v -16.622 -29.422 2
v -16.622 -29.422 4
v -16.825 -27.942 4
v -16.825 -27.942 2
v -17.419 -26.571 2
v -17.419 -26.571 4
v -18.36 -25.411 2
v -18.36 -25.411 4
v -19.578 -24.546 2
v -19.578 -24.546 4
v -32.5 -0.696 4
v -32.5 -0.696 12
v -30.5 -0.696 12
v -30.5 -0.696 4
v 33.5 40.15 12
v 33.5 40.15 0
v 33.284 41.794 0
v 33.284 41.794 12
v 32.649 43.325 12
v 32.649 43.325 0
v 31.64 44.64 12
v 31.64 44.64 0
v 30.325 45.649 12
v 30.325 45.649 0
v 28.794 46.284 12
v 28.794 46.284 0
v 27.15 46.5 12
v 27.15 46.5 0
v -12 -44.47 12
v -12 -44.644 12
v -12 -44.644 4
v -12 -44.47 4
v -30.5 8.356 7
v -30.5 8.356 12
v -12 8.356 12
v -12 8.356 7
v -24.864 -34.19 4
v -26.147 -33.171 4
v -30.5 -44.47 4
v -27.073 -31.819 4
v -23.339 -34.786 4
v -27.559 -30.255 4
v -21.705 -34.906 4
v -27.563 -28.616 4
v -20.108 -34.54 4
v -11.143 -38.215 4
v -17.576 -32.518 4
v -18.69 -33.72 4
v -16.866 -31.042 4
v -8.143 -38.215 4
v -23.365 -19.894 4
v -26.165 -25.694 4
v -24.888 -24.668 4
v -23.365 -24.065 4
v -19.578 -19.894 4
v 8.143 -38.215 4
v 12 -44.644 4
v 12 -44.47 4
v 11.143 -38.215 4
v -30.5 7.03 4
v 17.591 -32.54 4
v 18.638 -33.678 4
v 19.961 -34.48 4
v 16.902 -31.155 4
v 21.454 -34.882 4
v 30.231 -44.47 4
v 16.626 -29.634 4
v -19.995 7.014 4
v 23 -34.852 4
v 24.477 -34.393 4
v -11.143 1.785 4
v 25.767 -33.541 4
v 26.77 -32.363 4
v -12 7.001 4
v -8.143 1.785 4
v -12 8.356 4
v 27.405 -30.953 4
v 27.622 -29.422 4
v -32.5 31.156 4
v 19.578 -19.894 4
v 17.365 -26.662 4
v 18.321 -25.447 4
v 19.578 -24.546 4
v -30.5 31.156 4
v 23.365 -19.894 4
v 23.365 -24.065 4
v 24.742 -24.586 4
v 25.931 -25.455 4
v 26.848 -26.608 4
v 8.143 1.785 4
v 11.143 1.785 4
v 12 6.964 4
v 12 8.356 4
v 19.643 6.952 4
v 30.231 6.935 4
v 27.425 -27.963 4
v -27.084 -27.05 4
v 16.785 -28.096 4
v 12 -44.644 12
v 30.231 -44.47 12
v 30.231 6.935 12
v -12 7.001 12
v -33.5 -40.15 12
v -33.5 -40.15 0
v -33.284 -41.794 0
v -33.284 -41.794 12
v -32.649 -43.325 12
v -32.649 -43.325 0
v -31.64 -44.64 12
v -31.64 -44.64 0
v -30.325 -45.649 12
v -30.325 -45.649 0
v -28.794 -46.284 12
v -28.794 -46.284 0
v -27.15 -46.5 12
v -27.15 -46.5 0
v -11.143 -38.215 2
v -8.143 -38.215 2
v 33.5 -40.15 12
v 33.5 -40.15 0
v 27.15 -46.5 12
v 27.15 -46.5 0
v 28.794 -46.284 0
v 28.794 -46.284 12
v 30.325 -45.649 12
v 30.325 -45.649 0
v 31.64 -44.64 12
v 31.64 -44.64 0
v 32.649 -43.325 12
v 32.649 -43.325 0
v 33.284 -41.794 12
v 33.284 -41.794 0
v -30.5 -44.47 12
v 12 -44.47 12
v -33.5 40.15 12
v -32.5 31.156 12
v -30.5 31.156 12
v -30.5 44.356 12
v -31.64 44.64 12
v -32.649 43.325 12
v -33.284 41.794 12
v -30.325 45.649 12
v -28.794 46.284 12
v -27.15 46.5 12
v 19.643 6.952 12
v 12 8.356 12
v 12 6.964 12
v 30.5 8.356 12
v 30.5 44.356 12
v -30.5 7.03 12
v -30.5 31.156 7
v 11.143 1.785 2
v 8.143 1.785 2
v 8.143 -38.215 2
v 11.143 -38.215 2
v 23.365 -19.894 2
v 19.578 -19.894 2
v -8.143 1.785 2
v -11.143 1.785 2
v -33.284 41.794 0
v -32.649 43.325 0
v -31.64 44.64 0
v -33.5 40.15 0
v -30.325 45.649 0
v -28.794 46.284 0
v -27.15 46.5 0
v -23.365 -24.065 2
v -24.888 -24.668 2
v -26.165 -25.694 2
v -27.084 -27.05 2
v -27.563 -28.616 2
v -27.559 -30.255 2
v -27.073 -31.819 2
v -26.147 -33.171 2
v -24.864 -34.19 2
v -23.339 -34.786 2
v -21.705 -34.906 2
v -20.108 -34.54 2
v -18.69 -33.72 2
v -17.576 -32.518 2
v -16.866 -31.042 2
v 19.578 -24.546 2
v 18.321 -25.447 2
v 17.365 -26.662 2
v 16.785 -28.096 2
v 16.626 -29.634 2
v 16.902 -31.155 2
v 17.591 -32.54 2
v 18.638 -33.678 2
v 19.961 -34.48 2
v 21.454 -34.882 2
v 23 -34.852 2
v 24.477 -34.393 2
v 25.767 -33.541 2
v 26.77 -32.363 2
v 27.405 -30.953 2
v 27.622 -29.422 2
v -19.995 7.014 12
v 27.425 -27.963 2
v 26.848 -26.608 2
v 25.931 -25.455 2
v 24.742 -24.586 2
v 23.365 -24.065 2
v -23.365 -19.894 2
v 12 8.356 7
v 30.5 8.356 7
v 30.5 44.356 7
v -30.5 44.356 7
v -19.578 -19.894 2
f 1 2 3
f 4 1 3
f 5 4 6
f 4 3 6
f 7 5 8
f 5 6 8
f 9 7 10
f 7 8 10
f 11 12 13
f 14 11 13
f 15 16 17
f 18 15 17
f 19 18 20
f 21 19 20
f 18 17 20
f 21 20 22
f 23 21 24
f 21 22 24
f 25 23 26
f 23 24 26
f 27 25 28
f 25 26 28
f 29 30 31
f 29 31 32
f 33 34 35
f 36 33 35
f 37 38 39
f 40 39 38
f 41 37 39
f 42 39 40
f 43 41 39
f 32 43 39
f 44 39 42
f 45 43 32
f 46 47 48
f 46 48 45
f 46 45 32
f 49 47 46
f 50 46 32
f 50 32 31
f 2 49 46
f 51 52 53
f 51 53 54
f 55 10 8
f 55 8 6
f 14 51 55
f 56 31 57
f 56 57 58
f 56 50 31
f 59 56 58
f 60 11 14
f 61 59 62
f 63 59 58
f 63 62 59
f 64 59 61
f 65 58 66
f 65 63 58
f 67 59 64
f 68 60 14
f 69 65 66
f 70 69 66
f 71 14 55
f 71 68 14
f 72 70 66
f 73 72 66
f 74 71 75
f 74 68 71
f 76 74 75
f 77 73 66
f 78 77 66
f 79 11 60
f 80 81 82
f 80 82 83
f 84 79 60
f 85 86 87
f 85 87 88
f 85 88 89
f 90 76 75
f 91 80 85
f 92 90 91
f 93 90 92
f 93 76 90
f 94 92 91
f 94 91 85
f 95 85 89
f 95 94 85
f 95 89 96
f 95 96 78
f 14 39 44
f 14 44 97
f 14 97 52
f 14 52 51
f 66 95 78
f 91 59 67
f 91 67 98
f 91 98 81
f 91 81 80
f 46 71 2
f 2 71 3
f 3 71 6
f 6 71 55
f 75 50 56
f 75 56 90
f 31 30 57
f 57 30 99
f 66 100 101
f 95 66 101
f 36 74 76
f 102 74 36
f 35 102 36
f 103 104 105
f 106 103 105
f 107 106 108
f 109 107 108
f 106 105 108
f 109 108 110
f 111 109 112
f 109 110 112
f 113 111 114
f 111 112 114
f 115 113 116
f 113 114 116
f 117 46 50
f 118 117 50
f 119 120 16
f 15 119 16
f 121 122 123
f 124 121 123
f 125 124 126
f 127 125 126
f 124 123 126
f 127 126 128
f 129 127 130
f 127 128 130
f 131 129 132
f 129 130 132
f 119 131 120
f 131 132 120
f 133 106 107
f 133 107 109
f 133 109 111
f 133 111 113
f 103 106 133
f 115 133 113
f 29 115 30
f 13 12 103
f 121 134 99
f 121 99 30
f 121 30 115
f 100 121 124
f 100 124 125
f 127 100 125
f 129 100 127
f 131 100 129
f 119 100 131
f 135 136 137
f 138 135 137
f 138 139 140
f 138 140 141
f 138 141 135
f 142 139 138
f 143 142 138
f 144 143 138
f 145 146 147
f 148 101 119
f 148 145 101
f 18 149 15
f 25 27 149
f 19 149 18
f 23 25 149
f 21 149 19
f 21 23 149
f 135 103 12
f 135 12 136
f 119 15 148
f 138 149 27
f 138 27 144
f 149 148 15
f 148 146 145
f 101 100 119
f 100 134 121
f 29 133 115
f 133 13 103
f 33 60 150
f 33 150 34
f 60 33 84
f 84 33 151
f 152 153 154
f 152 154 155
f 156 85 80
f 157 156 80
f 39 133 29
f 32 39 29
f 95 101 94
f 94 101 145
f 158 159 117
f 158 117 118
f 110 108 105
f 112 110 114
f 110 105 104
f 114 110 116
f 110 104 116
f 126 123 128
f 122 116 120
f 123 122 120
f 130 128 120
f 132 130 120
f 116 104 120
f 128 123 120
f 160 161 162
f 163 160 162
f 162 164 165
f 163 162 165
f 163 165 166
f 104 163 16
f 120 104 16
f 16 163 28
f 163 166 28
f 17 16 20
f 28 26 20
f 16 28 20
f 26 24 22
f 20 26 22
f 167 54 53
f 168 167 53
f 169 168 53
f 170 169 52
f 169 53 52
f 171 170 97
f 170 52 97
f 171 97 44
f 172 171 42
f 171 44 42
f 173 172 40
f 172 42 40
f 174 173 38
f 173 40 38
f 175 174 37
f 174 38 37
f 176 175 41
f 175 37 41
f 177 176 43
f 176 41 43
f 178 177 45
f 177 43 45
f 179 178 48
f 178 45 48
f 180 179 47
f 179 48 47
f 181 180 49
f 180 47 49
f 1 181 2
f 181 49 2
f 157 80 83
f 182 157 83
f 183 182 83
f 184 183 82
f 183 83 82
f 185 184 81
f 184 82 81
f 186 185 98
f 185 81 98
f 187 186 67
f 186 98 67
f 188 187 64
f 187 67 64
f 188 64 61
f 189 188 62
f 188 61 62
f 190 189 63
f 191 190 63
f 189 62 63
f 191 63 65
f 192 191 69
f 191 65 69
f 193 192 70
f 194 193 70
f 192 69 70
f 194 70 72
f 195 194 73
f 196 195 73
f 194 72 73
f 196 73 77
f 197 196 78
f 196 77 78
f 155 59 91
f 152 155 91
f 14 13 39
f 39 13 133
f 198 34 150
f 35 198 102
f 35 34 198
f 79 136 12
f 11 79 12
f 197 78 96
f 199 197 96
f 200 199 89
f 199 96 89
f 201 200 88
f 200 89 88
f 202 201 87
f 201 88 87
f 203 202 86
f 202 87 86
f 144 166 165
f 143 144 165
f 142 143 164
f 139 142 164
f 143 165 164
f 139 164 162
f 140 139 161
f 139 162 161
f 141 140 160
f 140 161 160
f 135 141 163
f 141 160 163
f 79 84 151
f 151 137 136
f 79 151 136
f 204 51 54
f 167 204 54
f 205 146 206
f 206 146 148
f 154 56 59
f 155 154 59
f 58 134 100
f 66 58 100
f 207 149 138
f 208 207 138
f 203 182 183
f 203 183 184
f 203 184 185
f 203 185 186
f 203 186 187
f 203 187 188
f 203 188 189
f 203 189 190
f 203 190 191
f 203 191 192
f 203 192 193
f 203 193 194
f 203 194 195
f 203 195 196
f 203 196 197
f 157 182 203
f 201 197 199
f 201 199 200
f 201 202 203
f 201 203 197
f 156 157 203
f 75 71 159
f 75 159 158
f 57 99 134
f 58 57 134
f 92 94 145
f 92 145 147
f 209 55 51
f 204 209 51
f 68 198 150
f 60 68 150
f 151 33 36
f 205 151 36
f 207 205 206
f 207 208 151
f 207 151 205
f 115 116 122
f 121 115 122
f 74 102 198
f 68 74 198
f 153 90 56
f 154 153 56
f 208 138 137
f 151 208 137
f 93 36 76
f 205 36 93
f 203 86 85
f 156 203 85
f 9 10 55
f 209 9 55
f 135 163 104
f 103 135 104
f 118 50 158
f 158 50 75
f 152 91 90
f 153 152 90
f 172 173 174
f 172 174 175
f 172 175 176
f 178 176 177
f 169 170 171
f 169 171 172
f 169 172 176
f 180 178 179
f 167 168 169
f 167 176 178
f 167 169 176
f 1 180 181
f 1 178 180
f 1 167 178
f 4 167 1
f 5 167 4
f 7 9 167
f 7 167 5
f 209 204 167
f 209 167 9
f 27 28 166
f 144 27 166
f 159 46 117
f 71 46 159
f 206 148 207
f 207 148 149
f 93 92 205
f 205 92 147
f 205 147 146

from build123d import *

# Parameters (mm, degrees)
F1_DEPTH = 12
F3_DEPTH = 5
F2_W     = 24
F2_H     = 53
F5_DEPTH = 8
F6_DEPTH = 10
F7_W     = 3
F7_H     = 40
F8_DEPTH = 10
F9_DEPTH = 10


with BuildPart() as f1:
    # F0 (on Top) → F1 (new body)
    with BuildSketch(Plane.XY):
        with BuildLine():
            Line((27.15, 46.5), (-27.15, 46.5))
            ThreePointArc((-27.15, 46.5), (-31.6401280605, 44.6401280605), (-33.5, 40.15))
            Line((-33.5, 40.15), (-33.5, -40.15))
            ThreePointArc((-33.5, -40.15), (-31.6401280605, -44.6401280605), (-27.15, -46.5))
            Line((-27.15, -46.5), (27.15, -46.5))
            ThreePointArc((27.15, -46.5), (31.6401280605, -44.6401280605), (33.5, -40.15))
            Line((33.5, -40.15), (33.5, 40.15))
            ThreePointArc((33.5, 40.15), (31.6401280605, 44.6401280605), (27.15, 46.5))
        make_face()
    extrude(amount=F1_DEPTH)

    # F2 (on face) → F3 (cut)
    with BuildSketch(Plane.XY.offset(12)):
        Polygon((-30.5, 31.1559867114), (-30.5, 8.3555228412), (-12, 8.3555228412), (12, 8.3555228412), (30.5, 8.3555228412), (30.5, 44.3555228412), (-30.5, 44.3555228412), align=None)
    extrude(amount=-F3_DEPTH, mode=Mode.SUBTRACT)

    # F4 (on face) + F2 (on face) → F5 (cut)
    with BuildSketch(Plane.XY.offset(12)):
        Polygon((-19.9947099381, 7.0137236979), (-30.5000375956, 7.0301252197), (-30.5000375956, -0.696099014), (-30.5000375956, -0.6988210371), (-30.5000375956, -44.4698496722), (-12, -44.4698496722), (-12, 7.0012418968), align=None)
        with BuildLine():
            Line((-19.57828179, -19.8942141583), (-19.57828179, -24.546026914))
            ThreePointArc((-19.57828179, -24.546026914), (-17.4189463665, -26.5711645765), (-16.6222270916, -29.4223310783))
            ThreePointArc((-16.6222270916, -29.4223310783), (-25.5439247807, -33.7283715941), (-23.364767064, -24.064524212))
            Line((-23.364767064, -24.064524212), (-23.364767064, -19.8942141583))
            Line((-23.364767064, -19.8942141583), (-19.57828179, -19.8942141583))
        make_face(mode=Mode.SUBTRACT)
        Polygon((19.6427109083, 6.9518394763), (12, 6.9637717162), (12, -44.4698496722), (30.2305370569, -44.4698496722), (30.2305370569, 6.9353091531), align=None)
        with BuildLine():
            Line((23.364767064, -19.8942141583), (23.364767064, -24.064524212))
            ThreePointArc((23.364767064, -24.064524212), (26.4282676075, -26.0006333892), (27.6222270916, -29.4223310783))
            ThreePointArc((27.6222270916, -29.4223310783), (19.2710605898, -34.1256118034), (19.57828179, -24.546026914))
            Line((19.57828179, -24.546026914), (19.57828179, -19.8942141583))
            Line((19.57828179, -19.8942141583), (23.364767064, -19.8942141583))
        make_face(mode=Mode.SUBTRACT)
    with BuildSketch(Plane.XY.offset(12)):
        Polygon((-30.5, -0.696099014), (-30.5, 8.3555228412), (-30.5, 31.1559867114), (-32.5, 31.1559867114), (-32.5, -0.696099014), align=None)
        with Locations((0, -18.1444771588)):
            Rectangle(F2_W, F2_H)
        with BuildLine():
            ThreePointArc((-23.364767064, -24.064524212), (-21.4284150344, -23.9662679528), (-19.57828179, -24.546026914))
            Line((-19.57828179, -24.546026914), (-19.57828179, -19.8942141583))
            Line((-19.57828179, -19.8942141583), (-23.364767064, -19.8942141583))
            Line((-23.364767064, -19.8942141583), (-23.364767064, -24.064524212))
        make_face()
        with BuildLine():
            ThreePointArc((19.57828179, -24.546026914), (21.4284150344, -23.9662679528), (23.364767064, -24.064524212))
            Line((23.364767064, -24.064524212), (23.364767064, -19.8942141583))
            Line((23.364767064, -19.8942141583), (19.57828179, -19.8942141583))
            Line((19.57828179, -19.8942141583), (19.57828179, -24.546026914))
        make_face()
    extrude(amount=-F5_DEPTH, mode=Mode.SUBTRACT)

    # F2 (on face) → F6 (cut)
    with BuildSketch(Plane.XY.offset(12)):
        with BuildLine():
            ThreePointArc((-23.364767064, -24.064524212), (-25.5439247807, -33.7283715941), (-16.6222270916, -29.4223310783))
            ThreePointArc((-16.6222270916, -29.4223310783), (-17.4189463665, -26.5711645765), (-19.57828179, -24.546026914))
            ThreePointArc((-19.57828179, -24.546026914), (-21.4284150344, -23.9662679528), (-23.364767064, -24.064524212))
        make_face()
        with BuildLine():
            ThreePointArc((19.57828179, -24.546026914), (19.2710605898, -34.1256118034), (27.6222270916, -29.4223310783))
            ThreePointArc((27.6222270916, -29.4223310783), (26.4282676075, -26.0006333892), (23.364767064, -24.064524212))
            ThreePointArc((23.364767064, -24.064524212), (21.4284150344, -23.9662679528), (19.57828179, -24.546026914))
        make_face()
    extrude(amount=-F6_DEPTH, mode=Mode.SUBTRACT)

    # F7 (on face) → F8 (cut)
    with BuildSketch(Plane.XY.offset(12)):
        with Locations((-9.6433593556, -18.214944303)):
            Rectangle(F7_W, F7_H)
        Polygon((8.1433593556, 1.785055697), (8.1433593556, -38.214944303), (9.8566406444, -38.214944303), (11.1433593556, -38.214944303), (11.1433593556, 1.785055697), align=None)
    extrude(amount=-F8_DEPTH, mode=Mode.SUBTRACT)

    # F4 (on face) + F2 (on face) → F9 (cut)
    with BuildSketch(Plane.XY.offset(12)):
        with BuildLine():
            ThreePointArc((-16.6222270916, -29.4223310783), (-17.4189463665, -26.5711645765), (-19.57828179, -24.546026914))
            Line((-19.57828179, -24.546026914), (-19.57828179, -19.8942141583))
            Line((-19.57828179, -19.8942141583), (-23.364767064, -19.8942141583))
            Line((-23.364767064, -19.8942141583), (-23.364767064, -24.064524212))
            ThreePointArc((-23.364767064, -24.064524212), (-25.5439247807, -33.7283715941), (-16.6222270916, -29.4223310783))
        make_face()
    with BuildSketch(Plane.XY.offset(12)):
        with BuildLine():
            ThreePointArc((19.57828179, -24.546026914), (19.2710605898, -34.1256118034), (27.6222270916, -29.4223310783))
            ThreePointArc((27.6222270916, -29.4223310783), (26.4282676075, -26.0006333892), (23.364767064, -24.064524212))
            ThreePointArc((23.364767064, -24.064524212), (21.4284150344, -23.9662679528), (19.57828179, -24.546026914))
        make_face()
        with BuildLine():
            ThreePointArc((19.57828179, -24.546026914), (21.4284150344, -23.9662679528), (23.364767064, -24.064524212))
            Line((23.364767064, -24.064524212), (23.364767064, -19.8942141583))
            Line((23.364767064, -19.8942141583), (19.57828179, -19.8942141583))
            Line((19.57828179, -19.8942141583), (19.57828179, -24.546026914))
        make_face()
    extrude(amount=-F9_DEPTH, mode=Mode.SUBTRACT)


solid = f1.part
